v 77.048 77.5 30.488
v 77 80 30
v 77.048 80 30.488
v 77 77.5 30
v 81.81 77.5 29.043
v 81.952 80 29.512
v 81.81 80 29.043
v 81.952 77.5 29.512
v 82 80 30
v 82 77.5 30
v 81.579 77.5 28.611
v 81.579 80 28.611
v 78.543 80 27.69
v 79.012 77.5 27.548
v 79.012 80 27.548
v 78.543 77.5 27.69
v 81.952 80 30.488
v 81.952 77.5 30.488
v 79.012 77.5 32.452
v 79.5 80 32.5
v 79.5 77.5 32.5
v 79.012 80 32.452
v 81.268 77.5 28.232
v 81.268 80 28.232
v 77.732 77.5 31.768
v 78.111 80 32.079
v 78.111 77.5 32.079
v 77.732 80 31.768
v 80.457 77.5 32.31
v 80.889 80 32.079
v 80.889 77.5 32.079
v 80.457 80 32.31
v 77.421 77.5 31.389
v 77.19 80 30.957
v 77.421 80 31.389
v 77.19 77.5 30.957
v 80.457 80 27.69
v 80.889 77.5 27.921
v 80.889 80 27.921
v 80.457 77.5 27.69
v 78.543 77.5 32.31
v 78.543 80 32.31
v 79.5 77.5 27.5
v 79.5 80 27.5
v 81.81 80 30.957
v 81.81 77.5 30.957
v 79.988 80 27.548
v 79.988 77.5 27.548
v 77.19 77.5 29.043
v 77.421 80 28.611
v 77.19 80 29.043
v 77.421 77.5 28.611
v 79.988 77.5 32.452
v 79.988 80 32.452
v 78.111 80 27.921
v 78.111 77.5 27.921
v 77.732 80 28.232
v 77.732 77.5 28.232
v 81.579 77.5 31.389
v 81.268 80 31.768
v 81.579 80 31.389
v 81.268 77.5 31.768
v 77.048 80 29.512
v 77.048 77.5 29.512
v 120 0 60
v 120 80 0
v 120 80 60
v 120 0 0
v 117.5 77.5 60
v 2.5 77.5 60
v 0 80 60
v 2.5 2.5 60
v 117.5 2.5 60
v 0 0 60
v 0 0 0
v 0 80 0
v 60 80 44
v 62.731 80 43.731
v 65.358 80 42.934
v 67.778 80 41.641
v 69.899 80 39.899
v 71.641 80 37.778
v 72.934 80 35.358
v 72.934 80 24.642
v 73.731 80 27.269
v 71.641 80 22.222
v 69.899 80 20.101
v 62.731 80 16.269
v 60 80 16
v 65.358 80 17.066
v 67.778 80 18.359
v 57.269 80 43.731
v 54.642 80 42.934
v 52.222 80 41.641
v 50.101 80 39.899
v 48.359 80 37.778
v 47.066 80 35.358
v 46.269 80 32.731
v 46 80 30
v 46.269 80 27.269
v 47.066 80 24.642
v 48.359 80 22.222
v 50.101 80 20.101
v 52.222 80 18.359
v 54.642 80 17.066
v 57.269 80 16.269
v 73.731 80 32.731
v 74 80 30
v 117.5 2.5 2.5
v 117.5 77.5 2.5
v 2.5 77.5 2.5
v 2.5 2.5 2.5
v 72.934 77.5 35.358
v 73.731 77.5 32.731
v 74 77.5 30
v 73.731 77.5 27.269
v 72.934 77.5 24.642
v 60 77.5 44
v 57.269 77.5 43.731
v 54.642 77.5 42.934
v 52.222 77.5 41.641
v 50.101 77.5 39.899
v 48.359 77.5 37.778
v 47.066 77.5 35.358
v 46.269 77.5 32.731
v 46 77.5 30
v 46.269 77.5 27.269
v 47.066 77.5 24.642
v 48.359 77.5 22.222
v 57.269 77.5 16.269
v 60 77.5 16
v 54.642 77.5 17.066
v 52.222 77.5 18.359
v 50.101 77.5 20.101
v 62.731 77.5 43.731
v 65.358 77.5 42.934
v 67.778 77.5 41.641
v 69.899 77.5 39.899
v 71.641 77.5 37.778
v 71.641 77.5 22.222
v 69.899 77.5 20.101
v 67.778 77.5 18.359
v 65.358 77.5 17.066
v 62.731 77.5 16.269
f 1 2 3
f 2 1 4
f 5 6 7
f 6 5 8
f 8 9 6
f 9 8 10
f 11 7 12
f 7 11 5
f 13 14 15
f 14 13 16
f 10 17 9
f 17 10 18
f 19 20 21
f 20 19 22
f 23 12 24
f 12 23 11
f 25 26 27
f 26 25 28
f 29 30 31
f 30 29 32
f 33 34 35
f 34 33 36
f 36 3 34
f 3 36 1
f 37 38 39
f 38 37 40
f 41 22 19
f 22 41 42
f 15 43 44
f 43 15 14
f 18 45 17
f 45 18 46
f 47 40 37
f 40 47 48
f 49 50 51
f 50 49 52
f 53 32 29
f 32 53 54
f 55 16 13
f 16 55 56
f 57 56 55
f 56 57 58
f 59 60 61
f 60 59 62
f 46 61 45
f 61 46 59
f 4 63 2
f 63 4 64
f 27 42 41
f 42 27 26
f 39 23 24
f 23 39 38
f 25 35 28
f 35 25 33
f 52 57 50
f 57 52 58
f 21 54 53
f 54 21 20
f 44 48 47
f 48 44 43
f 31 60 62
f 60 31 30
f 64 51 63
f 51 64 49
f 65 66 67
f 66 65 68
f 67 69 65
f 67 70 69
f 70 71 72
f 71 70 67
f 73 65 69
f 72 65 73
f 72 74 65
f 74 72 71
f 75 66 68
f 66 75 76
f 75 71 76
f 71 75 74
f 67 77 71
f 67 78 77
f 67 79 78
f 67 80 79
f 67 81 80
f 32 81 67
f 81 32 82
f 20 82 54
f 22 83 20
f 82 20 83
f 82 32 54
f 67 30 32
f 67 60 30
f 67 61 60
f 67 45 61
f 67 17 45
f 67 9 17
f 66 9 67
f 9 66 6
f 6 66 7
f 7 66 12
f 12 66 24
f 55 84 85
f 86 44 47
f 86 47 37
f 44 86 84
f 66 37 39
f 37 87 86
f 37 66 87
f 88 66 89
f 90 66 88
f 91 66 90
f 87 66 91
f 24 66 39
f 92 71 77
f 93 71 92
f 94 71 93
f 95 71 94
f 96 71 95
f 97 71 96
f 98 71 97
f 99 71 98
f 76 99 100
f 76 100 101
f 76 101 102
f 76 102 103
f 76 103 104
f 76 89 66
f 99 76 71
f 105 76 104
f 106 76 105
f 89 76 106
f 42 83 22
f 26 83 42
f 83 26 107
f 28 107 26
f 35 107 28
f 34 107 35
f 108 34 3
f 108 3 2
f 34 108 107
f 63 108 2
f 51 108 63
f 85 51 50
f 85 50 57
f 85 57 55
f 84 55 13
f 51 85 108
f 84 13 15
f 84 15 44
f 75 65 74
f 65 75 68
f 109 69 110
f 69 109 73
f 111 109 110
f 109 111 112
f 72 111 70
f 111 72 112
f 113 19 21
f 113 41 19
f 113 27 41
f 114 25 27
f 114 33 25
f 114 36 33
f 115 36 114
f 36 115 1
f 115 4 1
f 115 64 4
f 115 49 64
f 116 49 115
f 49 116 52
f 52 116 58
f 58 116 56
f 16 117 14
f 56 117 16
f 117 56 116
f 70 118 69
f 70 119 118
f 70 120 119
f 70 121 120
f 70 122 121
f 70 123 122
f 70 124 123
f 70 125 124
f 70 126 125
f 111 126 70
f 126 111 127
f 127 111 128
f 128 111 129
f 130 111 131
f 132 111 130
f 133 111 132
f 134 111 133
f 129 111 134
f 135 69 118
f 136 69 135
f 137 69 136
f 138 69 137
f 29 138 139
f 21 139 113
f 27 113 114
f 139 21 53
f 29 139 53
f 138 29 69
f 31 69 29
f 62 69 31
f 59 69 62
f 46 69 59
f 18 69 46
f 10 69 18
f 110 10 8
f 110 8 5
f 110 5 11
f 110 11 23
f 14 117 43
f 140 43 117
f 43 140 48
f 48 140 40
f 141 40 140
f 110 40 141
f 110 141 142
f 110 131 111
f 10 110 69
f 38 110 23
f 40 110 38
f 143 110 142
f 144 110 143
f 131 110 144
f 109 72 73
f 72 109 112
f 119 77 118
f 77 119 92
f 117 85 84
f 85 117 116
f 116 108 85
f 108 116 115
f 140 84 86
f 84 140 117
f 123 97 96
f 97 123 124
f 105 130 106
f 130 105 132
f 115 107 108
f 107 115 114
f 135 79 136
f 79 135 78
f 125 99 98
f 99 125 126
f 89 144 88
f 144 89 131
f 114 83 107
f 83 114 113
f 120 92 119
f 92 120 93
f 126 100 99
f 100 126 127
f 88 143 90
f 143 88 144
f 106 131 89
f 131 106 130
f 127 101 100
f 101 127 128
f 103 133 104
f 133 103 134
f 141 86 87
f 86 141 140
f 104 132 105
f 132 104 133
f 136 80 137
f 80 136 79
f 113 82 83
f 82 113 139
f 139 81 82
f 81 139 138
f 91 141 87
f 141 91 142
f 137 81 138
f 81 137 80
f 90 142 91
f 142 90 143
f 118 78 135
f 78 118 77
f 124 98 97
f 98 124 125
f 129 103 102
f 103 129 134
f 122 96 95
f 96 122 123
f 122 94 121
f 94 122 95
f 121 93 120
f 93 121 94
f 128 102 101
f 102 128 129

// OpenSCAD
$fn = 32;

// ----------------------------------------------------------------------
// Vent box: roundvent enclosure
// ----------------------------------------------------------------------

// --- parameters (mm) ---
box_l = 120;              // box length, X
box_w = 80;               // box width, Y
box_h = 60;               // box height, Z
wall_t = 2.5;             // shell wall thickness
vent_d = 28;              // central vent diameter
ring_d = 5;               // ring hole diameter
n_ring = 8;               // holes in the ring
ring_r = 19.5;            // ring radius

ring_step = 360 / n_ring;  // ring hole angular step

difference() {
  cube([box_l, box_w, box_h]);
  translate([wall_t, wall_t, wall_t])
    cube([box_l - 2 * wall_t, box_w - 2 * wall_t, box_h]);
  translate([box_l / 2, box_w - wall_t - 1, box_h / 2])
    rotate([-90, 0, 0]) cylinder(h = wall_t + 2, d = vent_d);
  for (i = [0 : n_ring - 1])
    translate([box_l / 2, box_w - wall_t - 1, box_h / 2])
      rotate([0, 0, i * ring_step])
        translate([ring_r, 0, 0]) rotate([-90, 0, 0])
          cylinder(h = wall_t + 2, d = ring_d);
}
